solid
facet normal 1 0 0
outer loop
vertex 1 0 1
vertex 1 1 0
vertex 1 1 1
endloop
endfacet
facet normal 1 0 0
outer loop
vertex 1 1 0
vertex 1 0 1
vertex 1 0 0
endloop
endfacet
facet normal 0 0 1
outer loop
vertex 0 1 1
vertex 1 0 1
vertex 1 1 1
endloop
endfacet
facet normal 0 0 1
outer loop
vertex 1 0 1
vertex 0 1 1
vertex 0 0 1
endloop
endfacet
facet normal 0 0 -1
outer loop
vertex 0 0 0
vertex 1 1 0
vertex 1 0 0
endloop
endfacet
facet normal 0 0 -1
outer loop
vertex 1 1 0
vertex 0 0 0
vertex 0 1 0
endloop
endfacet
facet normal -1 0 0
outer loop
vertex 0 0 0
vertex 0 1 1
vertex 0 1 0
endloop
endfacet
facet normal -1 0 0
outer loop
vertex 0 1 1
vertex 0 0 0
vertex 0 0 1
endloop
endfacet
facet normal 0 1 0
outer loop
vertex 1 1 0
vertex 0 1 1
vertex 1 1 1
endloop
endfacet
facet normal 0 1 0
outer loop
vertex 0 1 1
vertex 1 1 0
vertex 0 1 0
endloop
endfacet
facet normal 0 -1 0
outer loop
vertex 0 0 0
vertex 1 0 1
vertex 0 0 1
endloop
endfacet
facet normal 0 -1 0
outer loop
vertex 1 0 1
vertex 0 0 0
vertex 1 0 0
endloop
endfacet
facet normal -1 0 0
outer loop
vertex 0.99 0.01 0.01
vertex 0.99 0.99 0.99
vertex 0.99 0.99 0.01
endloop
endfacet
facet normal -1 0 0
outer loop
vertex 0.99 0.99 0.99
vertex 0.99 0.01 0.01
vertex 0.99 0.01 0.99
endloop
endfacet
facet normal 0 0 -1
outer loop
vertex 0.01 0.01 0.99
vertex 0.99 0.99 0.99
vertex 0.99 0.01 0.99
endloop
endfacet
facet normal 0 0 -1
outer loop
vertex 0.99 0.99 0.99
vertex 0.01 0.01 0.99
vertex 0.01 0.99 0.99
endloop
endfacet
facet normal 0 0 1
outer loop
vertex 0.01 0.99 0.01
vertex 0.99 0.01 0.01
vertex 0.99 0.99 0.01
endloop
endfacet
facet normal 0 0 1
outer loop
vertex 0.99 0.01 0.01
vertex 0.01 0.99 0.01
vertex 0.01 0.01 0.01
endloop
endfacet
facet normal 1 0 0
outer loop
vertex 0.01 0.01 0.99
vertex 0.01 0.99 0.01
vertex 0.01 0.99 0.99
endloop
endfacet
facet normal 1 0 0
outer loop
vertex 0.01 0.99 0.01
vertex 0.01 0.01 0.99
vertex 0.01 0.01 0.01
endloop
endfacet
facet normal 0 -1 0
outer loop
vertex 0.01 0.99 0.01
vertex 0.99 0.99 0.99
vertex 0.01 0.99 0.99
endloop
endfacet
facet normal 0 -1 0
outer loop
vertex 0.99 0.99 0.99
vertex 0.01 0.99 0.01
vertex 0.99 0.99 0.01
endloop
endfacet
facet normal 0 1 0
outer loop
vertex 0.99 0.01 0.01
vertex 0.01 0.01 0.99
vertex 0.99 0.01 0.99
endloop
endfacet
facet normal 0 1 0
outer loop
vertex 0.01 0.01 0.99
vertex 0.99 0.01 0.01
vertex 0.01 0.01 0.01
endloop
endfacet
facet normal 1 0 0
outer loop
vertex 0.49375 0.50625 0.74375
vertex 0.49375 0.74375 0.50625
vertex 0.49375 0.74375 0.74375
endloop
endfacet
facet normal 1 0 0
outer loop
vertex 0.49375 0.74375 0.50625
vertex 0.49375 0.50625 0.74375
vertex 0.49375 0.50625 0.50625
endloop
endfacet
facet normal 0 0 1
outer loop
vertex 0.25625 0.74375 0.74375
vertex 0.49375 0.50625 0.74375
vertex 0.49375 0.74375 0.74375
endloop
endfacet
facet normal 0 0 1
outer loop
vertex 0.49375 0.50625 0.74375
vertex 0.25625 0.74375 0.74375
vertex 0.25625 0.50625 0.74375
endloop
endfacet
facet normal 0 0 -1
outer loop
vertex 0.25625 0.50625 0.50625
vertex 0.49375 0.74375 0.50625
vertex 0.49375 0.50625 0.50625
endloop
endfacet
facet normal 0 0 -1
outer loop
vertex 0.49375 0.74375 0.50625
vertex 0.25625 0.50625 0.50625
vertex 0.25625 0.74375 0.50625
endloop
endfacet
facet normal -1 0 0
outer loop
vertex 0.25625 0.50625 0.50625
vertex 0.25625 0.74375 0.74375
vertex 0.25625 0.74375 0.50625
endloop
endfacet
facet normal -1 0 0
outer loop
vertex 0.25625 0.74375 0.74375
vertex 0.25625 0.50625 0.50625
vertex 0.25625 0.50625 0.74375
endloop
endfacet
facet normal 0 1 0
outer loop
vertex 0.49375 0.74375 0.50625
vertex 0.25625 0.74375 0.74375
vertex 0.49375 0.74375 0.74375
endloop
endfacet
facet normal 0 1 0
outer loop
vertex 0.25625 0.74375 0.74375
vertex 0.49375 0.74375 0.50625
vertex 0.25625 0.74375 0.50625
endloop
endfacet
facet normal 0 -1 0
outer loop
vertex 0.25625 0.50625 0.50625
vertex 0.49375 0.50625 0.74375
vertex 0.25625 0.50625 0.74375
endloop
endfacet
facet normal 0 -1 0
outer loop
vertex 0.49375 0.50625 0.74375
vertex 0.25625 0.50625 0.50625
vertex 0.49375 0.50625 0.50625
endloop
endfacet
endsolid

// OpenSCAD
translate([0.375, 0.625, 0.625]) color([0.16837589335630898, 0.8764134615484998, 0.07351501458473586]) cube([0.2375, 0.2375, 0.2375], center=true);
color([0.3,0.3,0.3,0.3]) difference() { cube([1,1,1]); translate([0.01,0.01,0.01]) cube([0.98,0.98,0.98]); }
